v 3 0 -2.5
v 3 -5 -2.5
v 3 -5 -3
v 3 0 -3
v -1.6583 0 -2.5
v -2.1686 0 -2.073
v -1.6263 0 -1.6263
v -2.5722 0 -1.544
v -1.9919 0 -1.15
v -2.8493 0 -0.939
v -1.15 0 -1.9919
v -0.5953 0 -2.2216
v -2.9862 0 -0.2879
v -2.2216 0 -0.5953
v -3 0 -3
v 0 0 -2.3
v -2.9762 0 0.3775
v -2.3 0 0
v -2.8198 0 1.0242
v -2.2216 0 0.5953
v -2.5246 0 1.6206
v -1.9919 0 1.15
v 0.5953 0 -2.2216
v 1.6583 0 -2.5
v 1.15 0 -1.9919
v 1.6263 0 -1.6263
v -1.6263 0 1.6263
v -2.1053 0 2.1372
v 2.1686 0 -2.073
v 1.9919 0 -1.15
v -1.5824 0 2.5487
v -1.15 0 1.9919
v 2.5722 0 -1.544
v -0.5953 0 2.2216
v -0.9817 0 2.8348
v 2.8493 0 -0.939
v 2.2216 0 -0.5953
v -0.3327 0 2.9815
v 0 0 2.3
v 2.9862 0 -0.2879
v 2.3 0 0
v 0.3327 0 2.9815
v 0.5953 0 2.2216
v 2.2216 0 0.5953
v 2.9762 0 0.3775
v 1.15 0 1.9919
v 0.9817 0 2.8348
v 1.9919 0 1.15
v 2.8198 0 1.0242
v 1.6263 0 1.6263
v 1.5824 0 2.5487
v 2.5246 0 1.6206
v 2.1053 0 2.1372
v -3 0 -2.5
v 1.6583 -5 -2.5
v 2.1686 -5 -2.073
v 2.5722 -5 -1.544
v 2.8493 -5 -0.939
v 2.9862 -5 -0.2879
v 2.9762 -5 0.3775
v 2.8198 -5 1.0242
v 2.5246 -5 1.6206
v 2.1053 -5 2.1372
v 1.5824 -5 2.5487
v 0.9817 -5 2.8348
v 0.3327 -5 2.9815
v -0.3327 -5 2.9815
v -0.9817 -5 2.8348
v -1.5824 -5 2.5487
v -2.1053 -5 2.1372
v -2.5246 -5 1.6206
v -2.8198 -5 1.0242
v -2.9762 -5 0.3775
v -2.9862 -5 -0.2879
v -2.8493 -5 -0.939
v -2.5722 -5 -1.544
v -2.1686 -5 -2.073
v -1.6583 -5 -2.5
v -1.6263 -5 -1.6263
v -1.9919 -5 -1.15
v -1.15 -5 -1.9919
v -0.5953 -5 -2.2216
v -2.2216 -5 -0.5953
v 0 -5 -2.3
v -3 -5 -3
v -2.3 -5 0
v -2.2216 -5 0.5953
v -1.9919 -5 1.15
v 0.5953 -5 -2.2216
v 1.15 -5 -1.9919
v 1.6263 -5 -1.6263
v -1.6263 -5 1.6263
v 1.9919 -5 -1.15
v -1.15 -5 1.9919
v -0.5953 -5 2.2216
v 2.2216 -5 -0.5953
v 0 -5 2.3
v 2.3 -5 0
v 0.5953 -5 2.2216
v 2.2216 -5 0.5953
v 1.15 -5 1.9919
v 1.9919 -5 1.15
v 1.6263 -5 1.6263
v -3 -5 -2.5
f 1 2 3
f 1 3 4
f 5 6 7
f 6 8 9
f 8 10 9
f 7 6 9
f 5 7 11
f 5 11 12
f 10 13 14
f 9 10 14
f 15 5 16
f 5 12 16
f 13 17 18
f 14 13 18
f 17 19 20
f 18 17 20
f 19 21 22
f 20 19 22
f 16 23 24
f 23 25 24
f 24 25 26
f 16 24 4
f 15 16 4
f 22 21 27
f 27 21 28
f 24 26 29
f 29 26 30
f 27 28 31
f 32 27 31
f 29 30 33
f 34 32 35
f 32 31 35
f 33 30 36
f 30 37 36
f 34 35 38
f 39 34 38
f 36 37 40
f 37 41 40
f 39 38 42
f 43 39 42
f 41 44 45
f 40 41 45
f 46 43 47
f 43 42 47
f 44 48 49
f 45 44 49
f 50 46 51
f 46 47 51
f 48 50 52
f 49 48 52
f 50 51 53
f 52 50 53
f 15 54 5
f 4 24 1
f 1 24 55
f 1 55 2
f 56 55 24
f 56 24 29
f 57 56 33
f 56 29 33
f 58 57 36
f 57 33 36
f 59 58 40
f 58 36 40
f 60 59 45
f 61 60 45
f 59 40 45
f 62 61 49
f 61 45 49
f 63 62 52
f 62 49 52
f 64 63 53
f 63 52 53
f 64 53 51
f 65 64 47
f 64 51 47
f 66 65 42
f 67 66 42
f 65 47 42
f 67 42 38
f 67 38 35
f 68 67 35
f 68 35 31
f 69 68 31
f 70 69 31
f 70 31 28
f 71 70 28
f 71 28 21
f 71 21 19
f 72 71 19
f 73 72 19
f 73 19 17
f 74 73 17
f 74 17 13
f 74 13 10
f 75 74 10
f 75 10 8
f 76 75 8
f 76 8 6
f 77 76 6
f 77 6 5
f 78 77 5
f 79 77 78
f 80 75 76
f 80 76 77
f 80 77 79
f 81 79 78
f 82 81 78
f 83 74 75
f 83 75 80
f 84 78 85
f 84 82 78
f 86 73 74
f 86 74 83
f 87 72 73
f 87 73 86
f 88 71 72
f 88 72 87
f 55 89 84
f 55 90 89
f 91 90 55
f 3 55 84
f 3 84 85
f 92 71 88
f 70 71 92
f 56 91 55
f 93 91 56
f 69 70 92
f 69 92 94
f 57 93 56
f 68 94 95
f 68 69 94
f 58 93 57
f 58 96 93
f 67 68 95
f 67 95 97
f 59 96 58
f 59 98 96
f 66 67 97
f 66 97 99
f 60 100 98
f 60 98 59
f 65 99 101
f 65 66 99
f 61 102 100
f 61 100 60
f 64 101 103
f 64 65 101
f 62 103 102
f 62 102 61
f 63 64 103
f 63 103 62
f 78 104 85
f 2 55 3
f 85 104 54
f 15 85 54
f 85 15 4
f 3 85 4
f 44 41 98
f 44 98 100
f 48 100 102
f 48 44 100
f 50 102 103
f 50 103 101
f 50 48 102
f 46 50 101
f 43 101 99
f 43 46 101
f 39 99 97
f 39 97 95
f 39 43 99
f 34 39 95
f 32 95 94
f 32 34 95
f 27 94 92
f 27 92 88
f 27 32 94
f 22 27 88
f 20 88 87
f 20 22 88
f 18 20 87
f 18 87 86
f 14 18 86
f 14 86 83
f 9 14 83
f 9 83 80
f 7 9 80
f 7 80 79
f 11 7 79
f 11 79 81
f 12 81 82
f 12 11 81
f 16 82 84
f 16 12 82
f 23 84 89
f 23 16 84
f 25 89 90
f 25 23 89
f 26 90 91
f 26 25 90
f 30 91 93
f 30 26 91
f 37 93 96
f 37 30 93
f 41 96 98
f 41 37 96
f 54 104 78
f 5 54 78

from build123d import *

# Parameters (mm, degrees)
F0_R     = 3
F0_R_2   = 2.3
F1_DEPTH = 5
F3_START = -2.5
F2_W     = 6
F2_H     = 5
F3_DEPTH = 0.5


with BuildPart() as f1:
    # F0 (on Front) → F1 (new body)
    with BuildSketch(Plane.XZ):
        Circle(F0_R)
        Circle(F0_R_2, mode=Mode.SUBTRACT)
    extrude(amount=F1_DEPTH)

    # F2 (on Top) → F3 (join)
    with BuildSketch(Plane.XY.offset(F3_START)):
        with Locations((0, -2.5)):
            Rectangle(F2_W, F2_H)
    extrude(amount=-F3_DEPTH)


solid = f1.part
